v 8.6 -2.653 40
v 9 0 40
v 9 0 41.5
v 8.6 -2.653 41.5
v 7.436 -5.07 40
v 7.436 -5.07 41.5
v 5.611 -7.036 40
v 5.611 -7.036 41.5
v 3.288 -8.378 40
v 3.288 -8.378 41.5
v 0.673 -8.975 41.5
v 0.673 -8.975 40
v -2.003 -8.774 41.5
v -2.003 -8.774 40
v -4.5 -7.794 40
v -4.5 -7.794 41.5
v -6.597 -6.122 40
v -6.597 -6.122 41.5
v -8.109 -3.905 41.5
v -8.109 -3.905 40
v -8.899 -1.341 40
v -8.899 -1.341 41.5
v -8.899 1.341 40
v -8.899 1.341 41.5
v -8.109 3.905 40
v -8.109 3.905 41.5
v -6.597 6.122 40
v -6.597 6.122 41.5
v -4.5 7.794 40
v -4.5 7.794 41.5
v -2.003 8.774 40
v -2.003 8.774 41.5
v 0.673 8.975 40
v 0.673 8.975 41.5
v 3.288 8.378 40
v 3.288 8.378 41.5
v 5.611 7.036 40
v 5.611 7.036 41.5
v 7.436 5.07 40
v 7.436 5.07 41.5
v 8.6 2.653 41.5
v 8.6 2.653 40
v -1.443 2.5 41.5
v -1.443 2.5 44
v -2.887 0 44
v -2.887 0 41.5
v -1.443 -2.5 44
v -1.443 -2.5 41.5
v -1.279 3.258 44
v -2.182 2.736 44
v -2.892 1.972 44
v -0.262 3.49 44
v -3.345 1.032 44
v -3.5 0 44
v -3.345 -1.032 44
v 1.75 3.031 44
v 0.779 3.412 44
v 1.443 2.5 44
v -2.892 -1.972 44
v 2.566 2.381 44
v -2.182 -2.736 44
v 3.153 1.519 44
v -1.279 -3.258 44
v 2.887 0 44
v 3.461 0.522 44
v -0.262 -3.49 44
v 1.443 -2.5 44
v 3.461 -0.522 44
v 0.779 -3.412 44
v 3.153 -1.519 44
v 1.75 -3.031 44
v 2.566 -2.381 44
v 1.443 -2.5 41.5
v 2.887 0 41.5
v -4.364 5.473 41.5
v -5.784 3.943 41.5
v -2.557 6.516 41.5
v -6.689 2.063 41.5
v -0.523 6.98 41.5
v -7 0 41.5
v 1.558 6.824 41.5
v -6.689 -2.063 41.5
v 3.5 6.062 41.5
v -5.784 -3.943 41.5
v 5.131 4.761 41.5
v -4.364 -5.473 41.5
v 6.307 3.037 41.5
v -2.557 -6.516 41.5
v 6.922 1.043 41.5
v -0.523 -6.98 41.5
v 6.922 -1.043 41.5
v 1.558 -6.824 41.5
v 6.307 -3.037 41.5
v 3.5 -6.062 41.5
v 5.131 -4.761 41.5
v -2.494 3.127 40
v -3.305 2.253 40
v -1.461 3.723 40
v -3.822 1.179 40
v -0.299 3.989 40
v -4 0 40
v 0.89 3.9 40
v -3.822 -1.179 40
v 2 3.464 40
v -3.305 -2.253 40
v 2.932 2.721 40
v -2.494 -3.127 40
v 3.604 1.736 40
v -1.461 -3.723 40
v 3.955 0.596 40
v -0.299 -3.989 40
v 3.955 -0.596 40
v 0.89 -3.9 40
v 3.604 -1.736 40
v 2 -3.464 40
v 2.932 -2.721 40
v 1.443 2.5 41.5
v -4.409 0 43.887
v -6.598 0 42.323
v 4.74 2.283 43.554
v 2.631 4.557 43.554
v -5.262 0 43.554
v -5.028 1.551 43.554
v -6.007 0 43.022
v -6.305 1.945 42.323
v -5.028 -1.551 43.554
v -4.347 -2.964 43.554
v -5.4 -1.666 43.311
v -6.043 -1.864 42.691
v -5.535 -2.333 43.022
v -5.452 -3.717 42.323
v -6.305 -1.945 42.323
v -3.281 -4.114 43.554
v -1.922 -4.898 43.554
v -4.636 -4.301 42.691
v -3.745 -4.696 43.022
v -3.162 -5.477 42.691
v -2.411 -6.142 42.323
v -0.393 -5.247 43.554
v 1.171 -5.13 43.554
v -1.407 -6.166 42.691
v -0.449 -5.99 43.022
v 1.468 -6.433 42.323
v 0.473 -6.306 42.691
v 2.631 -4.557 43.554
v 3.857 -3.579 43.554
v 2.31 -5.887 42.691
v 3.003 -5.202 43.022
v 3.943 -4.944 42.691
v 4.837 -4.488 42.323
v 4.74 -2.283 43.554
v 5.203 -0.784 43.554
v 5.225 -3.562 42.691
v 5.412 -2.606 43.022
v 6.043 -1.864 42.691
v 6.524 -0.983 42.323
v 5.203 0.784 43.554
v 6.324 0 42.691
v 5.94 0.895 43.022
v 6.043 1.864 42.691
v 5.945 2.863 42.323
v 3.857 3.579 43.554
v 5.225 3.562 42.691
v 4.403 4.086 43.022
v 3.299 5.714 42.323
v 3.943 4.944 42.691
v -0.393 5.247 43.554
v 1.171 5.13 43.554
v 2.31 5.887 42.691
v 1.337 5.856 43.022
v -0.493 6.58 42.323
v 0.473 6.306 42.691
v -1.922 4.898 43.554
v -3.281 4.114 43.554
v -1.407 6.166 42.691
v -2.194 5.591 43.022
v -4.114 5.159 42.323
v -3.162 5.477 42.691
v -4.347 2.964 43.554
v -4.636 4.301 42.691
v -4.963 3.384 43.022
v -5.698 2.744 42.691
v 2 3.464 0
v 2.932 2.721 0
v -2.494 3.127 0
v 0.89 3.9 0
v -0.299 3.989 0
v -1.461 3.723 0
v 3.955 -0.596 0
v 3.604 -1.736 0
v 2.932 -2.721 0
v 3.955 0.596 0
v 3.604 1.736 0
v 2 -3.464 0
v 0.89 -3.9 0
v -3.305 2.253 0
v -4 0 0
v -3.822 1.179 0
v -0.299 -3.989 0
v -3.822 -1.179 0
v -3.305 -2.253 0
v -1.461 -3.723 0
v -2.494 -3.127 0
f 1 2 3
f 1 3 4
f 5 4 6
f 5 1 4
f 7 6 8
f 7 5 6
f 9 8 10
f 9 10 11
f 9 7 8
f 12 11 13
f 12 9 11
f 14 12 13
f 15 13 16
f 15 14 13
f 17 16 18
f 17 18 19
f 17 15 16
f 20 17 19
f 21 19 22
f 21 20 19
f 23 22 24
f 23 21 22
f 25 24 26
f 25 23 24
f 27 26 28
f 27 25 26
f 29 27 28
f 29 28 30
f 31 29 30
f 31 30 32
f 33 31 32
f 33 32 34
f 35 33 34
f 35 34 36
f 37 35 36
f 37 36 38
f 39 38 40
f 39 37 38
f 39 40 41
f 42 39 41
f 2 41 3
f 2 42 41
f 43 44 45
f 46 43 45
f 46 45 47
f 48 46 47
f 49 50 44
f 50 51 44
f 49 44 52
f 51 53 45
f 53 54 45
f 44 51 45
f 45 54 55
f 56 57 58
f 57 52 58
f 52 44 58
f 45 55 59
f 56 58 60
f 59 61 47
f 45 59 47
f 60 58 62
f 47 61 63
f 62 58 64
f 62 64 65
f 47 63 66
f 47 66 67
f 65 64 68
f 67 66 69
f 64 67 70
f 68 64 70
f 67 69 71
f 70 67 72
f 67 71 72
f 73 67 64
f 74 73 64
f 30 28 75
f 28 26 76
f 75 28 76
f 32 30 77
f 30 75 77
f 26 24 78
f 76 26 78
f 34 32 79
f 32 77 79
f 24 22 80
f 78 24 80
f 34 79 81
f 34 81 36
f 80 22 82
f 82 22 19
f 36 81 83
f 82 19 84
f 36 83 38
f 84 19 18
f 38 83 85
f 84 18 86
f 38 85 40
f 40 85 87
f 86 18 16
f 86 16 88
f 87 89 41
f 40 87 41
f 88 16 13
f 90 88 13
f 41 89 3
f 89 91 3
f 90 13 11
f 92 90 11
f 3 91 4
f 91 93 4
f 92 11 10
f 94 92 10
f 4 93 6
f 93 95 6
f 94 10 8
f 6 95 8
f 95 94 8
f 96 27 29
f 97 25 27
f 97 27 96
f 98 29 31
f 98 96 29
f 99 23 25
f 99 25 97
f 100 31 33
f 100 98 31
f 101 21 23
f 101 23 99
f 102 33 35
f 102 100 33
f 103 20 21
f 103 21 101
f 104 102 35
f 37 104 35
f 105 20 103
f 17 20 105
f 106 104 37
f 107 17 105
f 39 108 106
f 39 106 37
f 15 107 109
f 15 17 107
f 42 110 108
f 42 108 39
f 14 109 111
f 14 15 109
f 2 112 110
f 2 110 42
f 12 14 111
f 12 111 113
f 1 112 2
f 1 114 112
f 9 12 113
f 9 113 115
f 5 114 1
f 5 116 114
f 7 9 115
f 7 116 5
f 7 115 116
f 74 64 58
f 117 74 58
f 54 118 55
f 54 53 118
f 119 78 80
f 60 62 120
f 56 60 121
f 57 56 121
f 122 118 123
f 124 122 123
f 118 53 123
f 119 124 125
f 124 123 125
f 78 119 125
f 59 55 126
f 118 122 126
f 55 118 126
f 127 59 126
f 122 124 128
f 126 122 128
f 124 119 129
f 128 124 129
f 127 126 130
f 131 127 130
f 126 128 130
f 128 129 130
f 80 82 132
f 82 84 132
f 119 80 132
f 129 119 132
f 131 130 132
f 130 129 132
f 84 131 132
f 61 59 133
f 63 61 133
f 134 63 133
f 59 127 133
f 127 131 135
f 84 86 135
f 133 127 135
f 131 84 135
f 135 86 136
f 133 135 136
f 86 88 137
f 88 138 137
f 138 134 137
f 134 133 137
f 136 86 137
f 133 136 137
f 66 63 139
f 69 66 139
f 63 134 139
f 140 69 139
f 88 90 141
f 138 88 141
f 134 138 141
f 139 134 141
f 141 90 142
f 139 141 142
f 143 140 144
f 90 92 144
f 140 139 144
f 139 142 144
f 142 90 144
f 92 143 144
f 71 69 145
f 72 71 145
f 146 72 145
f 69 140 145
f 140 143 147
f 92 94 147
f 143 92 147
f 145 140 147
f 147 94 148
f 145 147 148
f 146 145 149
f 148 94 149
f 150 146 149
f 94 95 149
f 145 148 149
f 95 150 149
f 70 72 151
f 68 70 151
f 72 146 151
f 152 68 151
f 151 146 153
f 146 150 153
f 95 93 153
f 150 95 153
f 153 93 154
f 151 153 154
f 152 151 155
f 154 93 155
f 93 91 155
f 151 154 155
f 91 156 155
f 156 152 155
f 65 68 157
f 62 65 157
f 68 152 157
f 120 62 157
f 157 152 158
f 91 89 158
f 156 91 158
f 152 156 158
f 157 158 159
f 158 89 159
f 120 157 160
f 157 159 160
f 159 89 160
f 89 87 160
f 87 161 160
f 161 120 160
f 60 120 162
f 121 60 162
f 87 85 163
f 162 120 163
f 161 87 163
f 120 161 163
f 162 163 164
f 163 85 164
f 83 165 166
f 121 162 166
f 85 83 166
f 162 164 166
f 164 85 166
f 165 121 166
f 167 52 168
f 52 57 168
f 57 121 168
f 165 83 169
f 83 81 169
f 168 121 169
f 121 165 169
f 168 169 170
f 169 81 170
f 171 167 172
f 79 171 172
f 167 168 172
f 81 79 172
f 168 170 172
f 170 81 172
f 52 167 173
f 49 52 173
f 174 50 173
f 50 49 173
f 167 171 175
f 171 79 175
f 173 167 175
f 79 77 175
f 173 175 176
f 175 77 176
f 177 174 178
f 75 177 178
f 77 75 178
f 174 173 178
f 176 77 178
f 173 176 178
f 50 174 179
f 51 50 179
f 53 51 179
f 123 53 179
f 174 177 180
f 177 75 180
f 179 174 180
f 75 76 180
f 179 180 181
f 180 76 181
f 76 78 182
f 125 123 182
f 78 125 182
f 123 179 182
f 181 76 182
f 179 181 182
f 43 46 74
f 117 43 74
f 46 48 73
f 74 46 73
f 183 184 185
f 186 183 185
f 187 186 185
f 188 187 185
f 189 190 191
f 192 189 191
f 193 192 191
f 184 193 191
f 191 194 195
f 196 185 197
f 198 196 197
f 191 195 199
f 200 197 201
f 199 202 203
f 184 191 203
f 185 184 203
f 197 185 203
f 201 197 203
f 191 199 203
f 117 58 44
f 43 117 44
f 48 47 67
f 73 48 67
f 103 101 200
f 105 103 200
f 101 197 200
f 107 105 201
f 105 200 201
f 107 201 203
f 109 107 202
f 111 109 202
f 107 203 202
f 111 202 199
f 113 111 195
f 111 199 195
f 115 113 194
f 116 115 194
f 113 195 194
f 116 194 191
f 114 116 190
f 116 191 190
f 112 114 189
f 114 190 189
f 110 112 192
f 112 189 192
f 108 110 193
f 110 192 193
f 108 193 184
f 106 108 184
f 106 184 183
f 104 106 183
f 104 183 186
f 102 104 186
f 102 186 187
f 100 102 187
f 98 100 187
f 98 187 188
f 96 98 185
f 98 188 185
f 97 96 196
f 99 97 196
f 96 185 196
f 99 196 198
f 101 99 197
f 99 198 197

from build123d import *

# Parameters (mm, degrees)
F3_DEPTH = 3
F4_R     = 9
F5_DEPTH = 1.5


with BuildPart() as f1:
    # F0 (on Front) → F1 (revolve)
    with BuildSketch(Plane.XZ):
        with BuildLine():
            Line((-4, 0), (0, 0))
            Line((0, 0), (0, 44))
            Line((0, 44), (-3.5, 44))
            ThreePointArc((-3.5, 44), (-5.650581, 43.310814), (-7, 41.5))
            Line((-7, 41.5), (-7, 40))
            Line((-7, 40), (-4, 40))
            Line((-4, 40), (-4, 0))
        make_face()
    revolve(axis=Axis((0, 0, 22), (0, 0, 1)))

    # F2 (on face) → F3 (cut)
    with BuildSketch(Plane.XY.offset(44)):
        Polygon((1.443376, 2.5), (-1.443376, 2.5), (-2.886751, 0), (-1.443376, -2.5), (1.443376, -2.5), (2.886751, 0), align=None)
    extrude(amount=-F3_DEPTH, mode=Mode.SUBTRACT)

    # F4 (on face) → F5 (join)
    with BuildSketch(Plane(origin=(0, 0, 40), x_dir=(1, 0, 0), z_dir=(0, 0, -1))):
        Circle(F4_R)
    extrude(amount=-F5_DEPTH)


solid = f1.part
